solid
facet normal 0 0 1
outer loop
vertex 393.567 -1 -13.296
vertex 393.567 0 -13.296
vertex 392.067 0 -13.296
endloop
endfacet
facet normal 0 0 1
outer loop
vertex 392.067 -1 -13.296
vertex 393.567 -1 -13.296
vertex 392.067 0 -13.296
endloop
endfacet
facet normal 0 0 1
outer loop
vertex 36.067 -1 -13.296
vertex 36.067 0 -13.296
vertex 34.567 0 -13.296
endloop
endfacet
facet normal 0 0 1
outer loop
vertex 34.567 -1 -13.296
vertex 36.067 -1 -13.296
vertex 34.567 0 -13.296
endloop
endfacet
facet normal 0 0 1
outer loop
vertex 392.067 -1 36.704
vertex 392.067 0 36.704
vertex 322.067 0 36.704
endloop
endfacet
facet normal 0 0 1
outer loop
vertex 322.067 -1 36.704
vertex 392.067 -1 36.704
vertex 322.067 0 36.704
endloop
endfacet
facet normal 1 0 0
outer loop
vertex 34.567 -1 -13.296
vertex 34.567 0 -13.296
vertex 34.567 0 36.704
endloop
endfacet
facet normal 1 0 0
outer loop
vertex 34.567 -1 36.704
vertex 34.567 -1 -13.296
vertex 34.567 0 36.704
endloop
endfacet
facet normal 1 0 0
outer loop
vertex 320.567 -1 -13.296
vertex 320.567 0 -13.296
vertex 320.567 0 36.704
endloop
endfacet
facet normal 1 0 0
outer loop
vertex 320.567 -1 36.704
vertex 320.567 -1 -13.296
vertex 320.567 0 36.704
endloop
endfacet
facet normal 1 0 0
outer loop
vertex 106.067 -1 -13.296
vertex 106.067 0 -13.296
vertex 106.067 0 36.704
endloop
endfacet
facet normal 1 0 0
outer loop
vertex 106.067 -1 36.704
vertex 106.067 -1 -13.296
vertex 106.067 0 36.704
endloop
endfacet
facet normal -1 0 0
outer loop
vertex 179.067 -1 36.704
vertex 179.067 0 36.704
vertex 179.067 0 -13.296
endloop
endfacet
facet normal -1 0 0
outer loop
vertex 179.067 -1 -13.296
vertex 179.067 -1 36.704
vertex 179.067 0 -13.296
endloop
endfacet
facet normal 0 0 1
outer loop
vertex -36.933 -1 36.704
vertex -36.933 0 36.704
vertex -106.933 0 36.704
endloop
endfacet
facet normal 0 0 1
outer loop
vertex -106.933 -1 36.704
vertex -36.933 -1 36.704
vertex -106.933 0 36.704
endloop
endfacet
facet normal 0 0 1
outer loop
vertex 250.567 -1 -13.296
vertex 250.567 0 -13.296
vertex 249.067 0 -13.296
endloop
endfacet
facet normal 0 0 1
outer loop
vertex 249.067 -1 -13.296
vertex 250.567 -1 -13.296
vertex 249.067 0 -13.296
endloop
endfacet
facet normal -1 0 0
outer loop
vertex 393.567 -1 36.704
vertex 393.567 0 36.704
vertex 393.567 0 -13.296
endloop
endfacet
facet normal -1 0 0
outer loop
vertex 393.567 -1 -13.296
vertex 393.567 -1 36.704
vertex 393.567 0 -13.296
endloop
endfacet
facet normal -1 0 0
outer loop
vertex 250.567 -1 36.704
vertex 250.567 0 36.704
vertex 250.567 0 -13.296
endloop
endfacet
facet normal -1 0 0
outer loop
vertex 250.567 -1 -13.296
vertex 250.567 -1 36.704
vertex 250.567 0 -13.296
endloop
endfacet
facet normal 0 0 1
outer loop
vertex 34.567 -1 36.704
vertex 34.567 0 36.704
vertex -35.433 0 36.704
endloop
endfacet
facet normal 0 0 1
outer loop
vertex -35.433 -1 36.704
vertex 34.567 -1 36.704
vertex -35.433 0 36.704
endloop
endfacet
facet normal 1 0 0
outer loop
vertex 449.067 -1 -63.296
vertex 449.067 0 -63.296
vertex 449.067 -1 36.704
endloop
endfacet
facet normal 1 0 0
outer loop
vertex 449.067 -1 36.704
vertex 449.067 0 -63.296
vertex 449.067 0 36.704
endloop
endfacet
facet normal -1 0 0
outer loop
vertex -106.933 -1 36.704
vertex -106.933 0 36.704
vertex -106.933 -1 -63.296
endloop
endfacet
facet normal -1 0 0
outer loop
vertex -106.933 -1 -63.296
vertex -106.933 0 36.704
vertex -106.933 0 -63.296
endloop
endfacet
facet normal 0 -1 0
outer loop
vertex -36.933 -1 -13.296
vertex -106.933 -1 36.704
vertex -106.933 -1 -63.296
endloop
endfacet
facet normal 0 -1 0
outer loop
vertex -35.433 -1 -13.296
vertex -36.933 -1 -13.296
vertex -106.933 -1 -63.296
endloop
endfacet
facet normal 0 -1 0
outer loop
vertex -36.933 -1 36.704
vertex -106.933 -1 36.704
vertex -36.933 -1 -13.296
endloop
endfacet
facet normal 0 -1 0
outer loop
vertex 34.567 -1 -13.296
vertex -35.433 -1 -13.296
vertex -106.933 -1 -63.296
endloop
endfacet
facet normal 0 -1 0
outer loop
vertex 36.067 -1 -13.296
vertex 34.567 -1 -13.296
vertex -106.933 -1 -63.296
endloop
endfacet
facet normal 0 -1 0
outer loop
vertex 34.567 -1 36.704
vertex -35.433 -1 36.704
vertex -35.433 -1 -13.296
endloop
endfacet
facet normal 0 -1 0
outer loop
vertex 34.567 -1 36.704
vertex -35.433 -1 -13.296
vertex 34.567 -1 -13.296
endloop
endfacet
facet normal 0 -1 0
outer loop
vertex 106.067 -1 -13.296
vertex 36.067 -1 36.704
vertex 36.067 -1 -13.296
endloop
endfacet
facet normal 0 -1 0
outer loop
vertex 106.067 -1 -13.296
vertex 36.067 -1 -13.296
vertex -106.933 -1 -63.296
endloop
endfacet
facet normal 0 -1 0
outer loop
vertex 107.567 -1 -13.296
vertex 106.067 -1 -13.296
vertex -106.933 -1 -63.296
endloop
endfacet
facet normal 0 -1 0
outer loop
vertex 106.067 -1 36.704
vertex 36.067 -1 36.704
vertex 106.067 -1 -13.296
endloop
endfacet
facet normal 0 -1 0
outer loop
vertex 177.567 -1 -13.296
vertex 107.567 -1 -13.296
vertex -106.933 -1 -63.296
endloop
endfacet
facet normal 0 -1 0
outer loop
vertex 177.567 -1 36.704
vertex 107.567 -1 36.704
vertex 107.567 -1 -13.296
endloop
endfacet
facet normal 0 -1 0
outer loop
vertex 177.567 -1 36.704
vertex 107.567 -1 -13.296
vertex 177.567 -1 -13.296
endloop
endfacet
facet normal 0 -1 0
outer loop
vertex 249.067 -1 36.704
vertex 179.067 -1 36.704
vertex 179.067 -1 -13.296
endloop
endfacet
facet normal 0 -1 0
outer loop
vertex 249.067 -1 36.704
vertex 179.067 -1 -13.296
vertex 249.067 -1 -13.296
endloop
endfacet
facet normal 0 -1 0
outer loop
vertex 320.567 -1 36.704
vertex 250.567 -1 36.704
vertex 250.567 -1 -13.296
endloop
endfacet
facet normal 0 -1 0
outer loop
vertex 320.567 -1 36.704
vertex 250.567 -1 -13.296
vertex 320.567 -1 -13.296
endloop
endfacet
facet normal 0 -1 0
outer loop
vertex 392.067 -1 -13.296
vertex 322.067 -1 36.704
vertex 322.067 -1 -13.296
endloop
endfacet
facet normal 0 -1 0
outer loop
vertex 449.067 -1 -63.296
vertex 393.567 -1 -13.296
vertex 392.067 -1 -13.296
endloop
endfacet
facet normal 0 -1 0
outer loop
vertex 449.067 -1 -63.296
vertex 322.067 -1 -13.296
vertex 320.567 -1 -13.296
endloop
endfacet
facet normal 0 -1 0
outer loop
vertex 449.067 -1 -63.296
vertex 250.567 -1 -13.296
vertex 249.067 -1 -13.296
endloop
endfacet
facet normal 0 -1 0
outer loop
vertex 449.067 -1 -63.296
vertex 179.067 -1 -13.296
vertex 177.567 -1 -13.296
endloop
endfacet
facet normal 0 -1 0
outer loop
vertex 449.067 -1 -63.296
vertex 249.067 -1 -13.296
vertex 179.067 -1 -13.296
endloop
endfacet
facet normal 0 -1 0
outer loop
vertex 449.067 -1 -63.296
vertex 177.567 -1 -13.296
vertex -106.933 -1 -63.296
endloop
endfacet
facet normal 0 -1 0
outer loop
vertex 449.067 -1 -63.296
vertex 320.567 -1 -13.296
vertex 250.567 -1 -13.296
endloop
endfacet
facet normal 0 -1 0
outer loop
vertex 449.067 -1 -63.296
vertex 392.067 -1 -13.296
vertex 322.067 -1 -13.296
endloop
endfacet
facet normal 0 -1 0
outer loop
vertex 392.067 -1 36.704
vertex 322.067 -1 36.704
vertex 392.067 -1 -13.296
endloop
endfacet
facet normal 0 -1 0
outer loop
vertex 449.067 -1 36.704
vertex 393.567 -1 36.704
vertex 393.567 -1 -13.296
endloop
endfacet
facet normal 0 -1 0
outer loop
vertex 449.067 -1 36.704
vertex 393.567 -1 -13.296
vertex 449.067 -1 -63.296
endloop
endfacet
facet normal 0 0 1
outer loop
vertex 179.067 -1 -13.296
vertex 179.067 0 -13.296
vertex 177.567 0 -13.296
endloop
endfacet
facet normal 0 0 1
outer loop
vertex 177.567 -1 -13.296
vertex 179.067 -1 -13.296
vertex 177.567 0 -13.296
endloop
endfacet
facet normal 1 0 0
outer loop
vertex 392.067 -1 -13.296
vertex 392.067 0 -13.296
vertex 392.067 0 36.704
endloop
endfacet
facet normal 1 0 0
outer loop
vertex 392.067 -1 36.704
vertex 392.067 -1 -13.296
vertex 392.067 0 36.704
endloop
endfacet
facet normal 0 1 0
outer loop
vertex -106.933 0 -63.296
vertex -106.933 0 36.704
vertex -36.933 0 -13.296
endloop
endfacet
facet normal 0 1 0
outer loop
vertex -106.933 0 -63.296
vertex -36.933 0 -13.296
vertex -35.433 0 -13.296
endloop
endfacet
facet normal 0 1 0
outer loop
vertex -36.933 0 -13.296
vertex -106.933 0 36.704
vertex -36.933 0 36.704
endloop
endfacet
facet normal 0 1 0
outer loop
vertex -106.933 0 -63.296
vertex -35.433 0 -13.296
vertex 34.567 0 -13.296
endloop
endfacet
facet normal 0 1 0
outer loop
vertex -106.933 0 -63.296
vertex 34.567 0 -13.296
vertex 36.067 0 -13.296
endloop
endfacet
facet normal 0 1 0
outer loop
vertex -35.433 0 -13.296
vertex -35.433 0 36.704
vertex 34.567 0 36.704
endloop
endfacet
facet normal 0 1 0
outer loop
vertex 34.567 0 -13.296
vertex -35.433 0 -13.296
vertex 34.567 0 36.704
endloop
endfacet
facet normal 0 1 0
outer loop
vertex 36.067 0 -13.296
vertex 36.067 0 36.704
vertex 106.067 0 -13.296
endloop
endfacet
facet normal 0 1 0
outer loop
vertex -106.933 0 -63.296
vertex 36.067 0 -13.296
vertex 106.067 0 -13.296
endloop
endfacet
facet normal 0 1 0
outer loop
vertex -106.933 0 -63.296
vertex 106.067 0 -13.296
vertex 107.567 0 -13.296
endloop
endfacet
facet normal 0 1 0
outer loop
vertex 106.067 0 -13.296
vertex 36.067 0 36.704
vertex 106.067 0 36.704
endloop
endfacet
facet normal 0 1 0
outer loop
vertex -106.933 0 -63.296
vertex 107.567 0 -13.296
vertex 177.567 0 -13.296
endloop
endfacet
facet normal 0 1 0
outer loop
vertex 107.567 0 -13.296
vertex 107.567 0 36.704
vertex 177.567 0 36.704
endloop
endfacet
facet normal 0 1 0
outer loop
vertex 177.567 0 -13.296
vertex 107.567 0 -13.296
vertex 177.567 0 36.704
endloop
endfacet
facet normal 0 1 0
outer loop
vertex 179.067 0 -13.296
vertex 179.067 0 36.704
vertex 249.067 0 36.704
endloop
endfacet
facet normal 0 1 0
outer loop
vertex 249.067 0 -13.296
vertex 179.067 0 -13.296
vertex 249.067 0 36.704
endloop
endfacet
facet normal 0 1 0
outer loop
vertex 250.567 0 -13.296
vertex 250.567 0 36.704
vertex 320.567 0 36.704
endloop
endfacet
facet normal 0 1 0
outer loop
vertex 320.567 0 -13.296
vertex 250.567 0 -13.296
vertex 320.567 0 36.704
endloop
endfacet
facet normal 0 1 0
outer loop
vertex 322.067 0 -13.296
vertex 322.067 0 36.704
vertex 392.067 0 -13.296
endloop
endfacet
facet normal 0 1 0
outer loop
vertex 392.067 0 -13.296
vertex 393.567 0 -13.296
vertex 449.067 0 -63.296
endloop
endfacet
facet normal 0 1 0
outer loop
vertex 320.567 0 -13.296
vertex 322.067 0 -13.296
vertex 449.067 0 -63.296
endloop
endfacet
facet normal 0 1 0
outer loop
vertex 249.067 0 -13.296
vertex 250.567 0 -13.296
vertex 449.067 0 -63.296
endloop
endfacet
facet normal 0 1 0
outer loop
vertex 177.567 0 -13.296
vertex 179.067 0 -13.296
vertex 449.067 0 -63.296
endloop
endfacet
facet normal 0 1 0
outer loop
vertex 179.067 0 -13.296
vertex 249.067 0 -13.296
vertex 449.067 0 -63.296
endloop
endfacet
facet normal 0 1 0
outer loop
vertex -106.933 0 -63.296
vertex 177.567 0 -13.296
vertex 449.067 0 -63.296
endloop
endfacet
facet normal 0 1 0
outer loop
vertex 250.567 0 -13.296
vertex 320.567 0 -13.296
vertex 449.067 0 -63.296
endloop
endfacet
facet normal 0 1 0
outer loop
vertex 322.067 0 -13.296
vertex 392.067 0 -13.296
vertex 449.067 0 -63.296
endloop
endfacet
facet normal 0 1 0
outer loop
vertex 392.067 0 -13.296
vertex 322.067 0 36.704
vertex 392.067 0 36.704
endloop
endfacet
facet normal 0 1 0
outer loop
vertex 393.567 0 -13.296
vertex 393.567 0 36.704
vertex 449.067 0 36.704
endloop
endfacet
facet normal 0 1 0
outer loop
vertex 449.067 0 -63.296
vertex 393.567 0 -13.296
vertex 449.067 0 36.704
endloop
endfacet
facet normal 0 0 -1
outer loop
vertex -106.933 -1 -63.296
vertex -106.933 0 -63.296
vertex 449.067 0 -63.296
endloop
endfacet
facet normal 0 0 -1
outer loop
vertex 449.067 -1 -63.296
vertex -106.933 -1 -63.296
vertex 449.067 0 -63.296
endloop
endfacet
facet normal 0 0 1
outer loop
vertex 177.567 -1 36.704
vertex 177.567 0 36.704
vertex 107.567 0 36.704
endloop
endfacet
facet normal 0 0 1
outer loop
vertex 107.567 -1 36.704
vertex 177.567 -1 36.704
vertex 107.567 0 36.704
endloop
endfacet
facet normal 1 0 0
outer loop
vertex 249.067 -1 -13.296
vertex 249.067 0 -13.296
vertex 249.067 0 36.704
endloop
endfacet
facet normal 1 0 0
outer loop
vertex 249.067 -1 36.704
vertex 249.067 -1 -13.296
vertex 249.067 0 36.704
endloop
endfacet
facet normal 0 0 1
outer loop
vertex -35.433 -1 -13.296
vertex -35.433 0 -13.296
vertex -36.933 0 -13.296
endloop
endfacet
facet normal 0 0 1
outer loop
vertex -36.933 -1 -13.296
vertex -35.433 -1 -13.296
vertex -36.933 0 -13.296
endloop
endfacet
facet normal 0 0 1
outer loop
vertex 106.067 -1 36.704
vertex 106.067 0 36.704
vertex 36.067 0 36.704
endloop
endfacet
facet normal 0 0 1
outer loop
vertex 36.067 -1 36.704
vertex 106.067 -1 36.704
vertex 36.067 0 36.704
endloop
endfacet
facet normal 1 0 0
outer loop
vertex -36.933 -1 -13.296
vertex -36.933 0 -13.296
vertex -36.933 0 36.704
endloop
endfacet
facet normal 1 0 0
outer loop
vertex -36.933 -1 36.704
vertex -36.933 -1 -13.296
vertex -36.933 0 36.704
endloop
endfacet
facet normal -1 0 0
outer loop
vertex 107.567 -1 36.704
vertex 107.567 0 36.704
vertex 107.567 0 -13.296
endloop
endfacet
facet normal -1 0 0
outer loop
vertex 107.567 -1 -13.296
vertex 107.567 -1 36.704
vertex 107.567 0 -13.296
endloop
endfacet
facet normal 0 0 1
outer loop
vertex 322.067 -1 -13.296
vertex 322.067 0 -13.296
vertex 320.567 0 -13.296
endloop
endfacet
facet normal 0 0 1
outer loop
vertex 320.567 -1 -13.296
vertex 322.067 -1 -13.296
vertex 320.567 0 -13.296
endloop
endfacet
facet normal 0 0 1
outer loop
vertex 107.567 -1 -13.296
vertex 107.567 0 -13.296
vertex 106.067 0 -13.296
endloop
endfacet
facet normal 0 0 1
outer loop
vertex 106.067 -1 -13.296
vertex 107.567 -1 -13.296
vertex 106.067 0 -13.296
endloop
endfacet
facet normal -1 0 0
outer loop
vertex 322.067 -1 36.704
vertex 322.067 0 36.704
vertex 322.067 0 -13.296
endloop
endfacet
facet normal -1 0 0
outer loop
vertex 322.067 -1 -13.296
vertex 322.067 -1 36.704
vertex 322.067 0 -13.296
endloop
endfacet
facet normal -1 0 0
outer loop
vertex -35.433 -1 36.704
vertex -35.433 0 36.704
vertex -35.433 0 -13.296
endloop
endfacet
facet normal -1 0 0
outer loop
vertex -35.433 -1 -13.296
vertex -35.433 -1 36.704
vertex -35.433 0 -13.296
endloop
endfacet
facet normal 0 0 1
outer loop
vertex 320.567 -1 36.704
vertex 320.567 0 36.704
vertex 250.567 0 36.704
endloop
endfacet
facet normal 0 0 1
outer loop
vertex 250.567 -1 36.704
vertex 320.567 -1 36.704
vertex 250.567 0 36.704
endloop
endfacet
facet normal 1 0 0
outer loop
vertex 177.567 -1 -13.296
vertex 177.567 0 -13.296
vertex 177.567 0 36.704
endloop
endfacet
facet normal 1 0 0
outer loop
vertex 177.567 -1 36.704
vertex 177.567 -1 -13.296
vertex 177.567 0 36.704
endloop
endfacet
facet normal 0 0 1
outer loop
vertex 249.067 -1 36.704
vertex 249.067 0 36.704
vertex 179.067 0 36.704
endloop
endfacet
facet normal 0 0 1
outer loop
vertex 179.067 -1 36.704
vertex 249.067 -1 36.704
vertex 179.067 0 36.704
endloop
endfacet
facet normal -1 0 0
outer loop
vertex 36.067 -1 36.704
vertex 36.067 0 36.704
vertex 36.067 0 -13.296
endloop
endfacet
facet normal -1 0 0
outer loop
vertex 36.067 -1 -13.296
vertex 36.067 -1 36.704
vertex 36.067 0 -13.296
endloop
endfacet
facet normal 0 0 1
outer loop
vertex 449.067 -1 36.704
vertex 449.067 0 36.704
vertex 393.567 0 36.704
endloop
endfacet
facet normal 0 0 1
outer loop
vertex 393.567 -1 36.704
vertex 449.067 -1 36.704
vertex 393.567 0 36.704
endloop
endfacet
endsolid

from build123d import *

# Parameters (mm, degrees)
F1_DEPTH = 1


with BuildPart() as f1:
    # F0 (on Front) → F1 (new body)
    with BuildSketch(Plane.XZ):
        Polygon((-106.93277, 36.703874), (-106.93277, -63.296126), (449.06723, -63.296126), (449.06723, 36.703874), (393.56723, 36.703874), (393.56723, -13.296126), (392.06723, -13.296126), (392.06723, 36.703874), (322.06723, 36.703874), (322.06723, -13.296126), (320.56723, -13.296126), (320.56723, 36.703874), (250.56723, 36.703874), (250.56723, -13.296126), (249.06723, -13.296126), (249.06723, 36.703874), (179.06723, 36.703874), (179.06723, -13.296126), (177.56723, -13.296126), (177.56723, 36.703874), (107.56723, 36.703874), (107.56723, -13.296126), (106.06723, -13.296126), (106.06723, 36.703874), (36.06723, 36.703874), (36.06723, -13.296126), (34.56723, -13.296126), (34.56723, 36.703874), (-35.43277, 36.703874), (-35.43277, -13.296126), (-36.93277, -13.296126), (-36.93277, 36.703874), align=None)
    extrude(amount=F1_DEPTH)


solid = f1.part
